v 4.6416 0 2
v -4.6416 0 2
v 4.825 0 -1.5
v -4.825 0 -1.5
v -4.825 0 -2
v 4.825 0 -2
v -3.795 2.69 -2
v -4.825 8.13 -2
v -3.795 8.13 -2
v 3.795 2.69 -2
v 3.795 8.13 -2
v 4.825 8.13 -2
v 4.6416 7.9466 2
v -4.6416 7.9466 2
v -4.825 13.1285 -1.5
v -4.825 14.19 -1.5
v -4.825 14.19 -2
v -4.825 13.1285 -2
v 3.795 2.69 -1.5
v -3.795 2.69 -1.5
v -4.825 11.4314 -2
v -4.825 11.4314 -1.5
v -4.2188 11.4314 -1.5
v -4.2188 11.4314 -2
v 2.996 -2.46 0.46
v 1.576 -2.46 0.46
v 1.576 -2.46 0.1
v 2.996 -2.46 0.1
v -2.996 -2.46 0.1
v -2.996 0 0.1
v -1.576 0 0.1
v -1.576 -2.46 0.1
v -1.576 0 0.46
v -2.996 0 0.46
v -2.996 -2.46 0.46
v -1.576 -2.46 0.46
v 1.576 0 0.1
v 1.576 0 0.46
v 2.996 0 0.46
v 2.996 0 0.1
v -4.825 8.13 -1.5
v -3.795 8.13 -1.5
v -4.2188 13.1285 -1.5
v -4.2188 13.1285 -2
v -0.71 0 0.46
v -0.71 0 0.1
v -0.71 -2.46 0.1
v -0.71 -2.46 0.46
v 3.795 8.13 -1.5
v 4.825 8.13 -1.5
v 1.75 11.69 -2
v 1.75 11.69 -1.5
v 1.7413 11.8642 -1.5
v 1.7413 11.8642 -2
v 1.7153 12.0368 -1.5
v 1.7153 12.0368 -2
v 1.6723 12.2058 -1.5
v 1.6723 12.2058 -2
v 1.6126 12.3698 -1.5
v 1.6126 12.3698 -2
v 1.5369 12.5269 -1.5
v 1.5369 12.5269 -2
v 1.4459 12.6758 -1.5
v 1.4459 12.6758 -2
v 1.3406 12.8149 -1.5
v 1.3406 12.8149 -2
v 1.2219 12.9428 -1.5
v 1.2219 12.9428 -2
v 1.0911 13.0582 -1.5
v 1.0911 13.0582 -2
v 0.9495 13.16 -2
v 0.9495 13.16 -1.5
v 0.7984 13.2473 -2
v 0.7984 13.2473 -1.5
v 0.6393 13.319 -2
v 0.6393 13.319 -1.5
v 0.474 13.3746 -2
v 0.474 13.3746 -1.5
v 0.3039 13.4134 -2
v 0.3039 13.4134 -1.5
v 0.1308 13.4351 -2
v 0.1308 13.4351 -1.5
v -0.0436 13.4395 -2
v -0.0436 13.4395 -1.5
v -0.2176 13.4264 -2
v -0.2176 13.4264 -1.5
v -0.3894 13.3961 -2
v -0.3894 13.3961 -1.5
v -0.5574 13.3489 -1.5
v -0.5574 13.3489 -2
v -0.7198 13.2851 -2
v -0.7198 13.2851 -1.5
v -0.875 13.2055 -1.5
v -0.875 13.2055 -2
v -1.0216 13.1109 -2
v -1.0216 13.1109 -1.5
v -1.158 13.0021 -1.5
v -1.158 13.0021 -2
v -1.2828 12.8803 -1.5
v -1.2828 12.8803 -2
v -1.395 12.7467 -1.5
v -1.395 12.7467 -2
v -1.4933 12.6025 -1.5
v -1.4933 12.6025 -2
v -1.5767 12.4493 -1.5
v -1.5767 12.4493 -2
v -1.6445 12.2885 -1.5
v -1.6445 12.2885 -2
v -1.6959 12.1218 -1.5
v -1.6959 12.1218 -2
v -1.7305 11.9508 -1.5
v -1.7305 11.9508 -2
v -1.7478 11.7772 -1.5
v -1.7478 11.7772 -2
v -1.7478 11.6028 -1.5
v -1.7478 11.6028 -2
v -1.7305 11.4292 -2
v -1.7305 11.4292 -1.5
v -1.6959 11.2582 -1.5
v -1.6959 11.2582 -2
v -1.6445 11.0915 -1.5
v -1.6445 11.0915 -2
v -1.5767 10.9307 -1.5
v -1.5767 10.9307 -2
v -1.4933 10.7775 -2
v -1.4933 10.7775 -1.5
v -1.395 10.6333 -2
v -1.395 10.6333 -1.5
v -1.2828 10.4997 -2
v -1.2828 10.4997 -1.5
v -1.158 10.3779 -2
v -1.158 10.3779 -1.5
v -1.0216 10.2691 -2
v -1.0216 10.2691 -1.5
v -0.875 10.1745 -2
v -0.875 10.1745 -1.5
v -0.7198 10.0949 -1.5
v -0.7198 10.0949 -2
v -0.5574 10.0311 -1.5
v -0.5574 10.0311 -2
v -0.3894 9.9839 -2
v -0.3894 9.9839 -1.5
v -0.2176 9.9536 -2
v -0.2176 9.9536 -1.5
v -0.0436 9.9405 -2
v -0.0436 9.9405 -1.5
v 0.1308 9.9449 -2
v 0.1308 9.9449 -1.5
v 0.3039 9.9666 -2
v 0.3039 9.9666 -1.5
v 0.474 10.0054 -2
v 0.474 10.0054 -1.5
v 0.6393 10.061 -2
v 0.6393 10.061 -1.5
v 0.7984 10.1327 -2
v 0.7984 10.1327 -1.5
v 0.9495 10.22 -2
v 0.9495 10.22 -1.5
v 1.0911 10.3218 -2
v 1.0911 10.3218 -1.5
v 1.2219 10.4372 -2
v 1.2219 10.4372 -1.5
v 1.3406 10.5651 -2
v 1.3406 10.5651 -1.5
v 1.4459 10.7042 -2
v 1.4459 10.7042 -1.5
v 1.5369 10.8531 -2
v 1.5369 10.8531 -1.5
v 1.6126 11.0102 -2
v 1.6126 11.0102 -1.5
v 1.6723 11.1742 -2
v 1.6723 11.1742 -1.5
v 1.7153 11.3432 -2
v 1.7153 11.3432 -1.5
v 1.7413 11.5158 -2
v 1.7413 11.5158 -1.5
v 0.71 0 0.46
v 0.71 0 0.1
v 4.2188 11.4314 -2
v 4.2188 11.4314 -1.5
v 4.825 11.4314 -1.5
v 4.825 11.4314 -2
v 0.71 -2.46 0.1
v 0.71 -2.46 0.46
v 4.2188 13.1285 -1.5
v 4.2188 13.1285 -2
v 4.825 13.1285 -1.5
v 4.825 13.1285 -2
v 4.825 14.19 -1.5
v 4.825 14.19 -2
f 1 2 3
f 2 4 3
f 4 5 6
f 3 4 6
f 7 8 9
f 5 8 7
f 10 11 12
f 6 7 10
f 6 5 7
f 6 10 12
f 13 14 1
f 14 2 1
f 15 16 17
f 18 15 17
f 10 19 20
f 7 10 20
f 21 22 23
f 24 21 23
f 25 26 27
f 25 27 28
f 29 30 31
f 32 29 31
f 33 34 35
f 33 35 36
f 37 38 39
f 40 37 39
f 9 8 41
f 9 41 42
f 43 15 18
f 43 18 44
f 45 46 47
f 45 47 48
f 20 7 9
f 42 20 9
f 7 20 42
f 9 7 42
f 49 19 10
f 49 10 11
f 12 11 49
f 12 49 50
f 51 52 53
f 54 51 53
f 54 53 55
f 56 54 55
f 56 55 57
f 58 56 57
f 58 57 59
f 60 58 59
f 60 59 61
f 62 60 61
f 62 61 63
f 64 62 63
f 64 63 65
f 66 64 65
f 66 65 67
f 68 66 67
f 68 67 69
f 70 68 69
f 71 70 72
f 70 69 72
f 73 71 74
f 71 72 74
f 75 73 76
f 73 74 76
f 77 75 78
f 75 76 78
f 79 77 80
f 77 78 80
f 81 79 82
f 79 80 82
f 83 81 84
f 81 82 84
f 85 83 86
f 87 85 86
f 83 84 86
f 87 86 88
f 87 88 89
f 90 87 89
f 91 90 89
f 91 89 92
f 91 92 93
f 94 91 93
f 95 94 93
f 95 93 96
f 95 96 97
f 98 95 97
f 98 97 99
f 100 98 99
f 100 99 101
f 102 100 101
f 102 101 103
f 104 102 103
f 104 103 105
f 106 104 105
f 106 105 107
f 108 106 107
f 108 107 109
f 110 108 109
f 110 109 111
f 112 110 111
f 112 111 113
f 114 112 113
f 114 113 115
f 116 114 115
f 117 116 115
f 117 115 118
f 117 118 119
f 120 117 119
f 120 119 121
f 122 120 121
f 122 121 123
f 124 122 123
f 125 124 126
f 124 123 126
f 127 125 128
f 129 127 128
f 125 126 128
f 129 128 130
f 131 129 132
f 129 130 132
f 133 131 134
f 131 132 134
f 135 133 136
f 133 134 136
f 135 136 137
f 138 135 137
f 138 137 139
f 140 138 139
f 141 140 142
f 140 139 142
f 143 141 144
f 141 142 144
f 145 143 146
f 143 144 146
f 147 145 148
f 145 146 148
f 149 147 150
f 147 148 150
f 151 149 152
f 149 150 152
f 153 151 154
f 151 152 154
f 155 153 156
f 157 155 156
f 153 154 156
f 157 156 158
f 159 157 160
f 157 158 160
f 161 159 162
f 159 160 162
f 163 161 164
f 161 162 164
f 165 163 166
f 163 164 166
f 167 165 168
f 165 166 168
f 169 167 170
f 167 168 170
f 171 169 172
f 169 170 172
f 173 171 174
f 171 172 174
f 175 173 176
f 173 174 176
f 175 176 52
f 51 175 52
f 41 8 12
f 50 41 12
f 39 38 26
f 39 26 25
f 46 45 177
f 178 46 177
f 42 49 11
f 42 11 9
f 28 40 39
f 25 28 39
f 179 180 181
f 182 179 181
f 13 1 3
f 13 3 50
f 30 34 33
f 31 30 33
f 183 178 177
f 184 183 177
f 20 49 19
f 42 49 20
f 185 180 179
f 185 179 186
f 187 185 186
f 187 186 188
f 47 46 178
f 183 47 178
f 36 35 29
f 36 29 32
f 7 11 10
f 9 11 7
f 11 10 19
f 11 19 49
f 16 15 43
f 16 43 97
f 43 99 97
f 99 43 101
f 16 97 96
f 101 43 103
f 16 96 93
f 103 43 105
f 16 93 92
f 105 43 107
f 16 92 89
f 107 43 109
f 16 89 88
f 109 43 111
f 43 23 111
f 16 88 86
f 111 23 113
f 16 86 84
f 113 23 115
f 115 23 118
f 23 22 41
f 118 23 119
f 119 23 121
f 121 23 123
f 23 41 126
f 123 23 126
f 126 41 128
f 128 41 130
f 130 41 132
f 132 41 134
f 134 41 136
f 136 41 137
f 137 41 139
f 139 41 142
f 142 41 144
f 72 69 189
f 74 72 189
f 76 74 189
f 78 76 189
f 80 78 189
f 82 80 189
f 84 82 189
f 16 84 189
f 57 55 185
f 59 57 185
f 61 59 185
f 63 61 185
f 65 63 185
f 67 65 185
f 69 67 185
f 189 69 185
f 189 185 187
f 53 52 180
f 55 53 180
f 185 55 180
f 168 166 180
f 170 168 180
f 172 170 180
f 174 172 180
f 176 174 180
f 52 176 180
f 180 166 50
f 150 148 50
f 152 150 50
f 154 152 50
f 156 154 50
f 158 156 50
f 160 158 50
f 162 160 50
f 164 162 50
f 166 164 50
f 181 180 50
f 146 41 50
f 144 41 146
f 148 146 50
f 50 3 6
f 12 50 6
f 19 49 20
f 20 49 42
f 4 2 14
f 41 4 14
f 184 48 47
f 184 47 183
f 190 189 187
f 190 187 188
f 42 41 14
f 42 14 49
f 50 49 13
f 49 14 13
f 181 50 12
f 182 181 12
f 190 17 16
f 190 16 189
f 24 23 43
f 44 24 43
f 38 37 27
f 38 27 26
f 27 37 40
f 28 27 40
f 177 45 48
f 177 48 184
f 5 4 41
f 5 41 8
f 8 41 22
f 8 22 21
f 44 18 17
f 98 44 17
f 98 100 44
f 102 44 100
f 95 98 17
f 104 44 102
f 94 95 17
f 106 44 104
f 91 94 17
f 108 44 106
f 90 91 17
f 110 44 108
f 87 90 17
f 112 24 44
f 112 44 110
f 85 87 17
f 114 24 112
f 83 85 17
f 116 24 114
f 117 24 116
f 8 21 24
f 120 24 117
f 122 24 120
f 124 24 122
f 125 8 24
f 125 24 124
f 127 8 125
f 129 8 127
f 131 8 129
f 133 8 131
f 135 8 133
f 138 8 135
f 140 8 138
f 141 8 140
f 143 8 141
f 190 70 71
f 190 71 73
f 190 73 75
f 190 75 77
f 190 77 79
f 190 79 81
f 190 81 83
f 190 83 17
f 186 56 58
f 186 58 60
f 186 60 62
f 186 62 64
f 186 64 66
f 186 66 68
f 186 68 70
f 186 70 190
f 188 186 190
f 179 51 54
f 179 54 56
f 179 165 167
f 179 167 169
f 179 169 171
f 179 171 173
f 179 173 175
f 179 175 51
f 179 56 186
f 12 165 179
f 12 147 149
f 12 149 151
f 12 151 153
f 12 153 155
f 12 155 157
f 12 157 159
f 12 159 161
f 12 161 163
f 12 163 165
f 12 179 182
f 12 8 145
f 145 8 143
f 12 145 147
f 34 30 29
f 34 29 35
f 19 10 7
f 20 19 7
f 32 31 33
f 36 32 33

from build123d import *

# Parameters (mm, degrees)
SKETCH1_W             = 9.65
SKETCH1_H             = 4
BOSS_EXTRUDE1_DEPTH   = 8.13
CHAMFER2_SIZE         = 3.5
CHAMFER2_SIZE2        = 0.183427227
SKETCH4_W             = 9.65
SKETCH4_H             = 0.5
BOSS_EXTRUDE2_DEPTH   = 6.06
CHAMFER3_SIZE         = 3.5
CHAMFER3_SIZE2        = 0.183427227
CHAMFER4_SIZE         = 3.5
CHAMFER4_SIZE2        = 0.183427227
SKETCH5_W             = 7.59
SKETCH5_H             = 5.44
CUT_EXTRUDE1_DEPTH    = 0.5
SKETCH7_W             = 7.59
SKETCH7_H             = 5.44
BOSS_EXTRUDE3_DEPTH   = 0.5
SKETCH8_W             = 1.42
SKETCH8_H             = 0.36
BOSS_EXTRUDE4_DEPTH   = 2.46
BOSS_EXTRUDE4_2_DEPTH = 2.46
BOSS_EXTRUDE4_3_DEPTH = 2.46
SKETCH9_R             = 1.75
CUT_EXTRUDE2_DEPTH    = 2.46
SKETCH10_W            = 0.606244437
SKETCH10_H            = 1.697116576
CUT_EXTRUDE3_DEPTH    = 2.46


with BuildPart() as part:
    # Sketch1 → Boss-Extrude1 (new body)
    with BuildSketch(Plane(origin=(0, 0, 0), x_dir=(1, 0, 0), z_dir=(0, 1, 0))):
        Rectangle(SKETCH1_W, SKETCH1_H)
    extrude(amount=BOSS_EXTRUDE1_DEPTH)

    # Chamfer2
    chamfer2_edges = [part.edges().sort_by_distance(p)[0] for p in [
        (0, 8.13, 2),
    ]]
    chamfer2_side = [part.faces().sort_by_distance(p)[0] for p in [
        (0, 8.13, 0),
    ]]
    chamfer(chamfer2_edges, length=CHAMFER2_SIZE, length2=CHAMFER2_SIZE2, reference=chamfer2_side[0])

    # Chamfer3
    chamfer3_edges = [part.edges().sort_by_distance(p)[0] for p in [
        (4.825, 3.973286386, 2),
    ]]
    chamfer3_side = [part.faces().sort_by_distance(p)[0] for p in [
        (4.825, 4.025084823, -0.00830765),
    ]]
    chamfer(chamfer3_edges, length=CHAMFER3_SIZE, length2=CHAMFER3_SIZE2, reference=chamfer3_side[0])

    # Chamfer4
    chamfer4_edges = [part.edges().sort_by_distance(p)[0] for p in [
        (-4.825, 3.973286386, 2),
    ]]
    chamfer4_side = [part.faces().sort_by_distance(p)[0] for p in [
        (-4.825, 4.025084823, -0.00830765),
    ]]
    chamfer(chamfer4_edges, length=CHAMFER4_SIZE, length2=CHAMFER4_SIZE2, reference=chamfer4_side[0])

    # Sketch5 → Cut-Extrude1 (cut)
    with BuildSketch(Plane(origin=(0, 0, -2), x_dir=(-1, 0, 0), z_dir=(0, 0, -1))):
        with Locations((0, 5.41)):
            Rectangle(SKETCH5_W, SKETCH5_H)
    extrude(amount=-CUT_EXTRUDE1_DEPTH, mode=Mode.SUBTRACT)


with BuildPart() as body_2:
    # Sketch4 → Boss-Extrude2 (new body)
    with BuildSketch(Plane(origin=(0, 8.13, 0), x_dir=(1, 0, 0), z_dir=(0, 1, 0))):
        with Locations((0, 1.75)):
            Rectangle(SKETCH4_W, SKETCH4_H)
    extrude(amount=BOSS_EXTRUDE2_DEPTH)

    # Sketch9 → Cut-Extrude2 (cut)
    with BuildSketch(Plane.XY.offset(-1.5)):
        with Locations((0, 11.69)):
            Circle(SKETCH9_R)
    extrude(amount=-CUT_EXTRUDE2_DEPTH, mode=Mode.SUBTRACT)

    # Sketch10 → Cut-Extrude3 (cut)
    with BuildSketch(Plane.XY.offset(-1.5)):
        with Locations((-4.521877782, 12.279991165)):
            Rectangle(SKETCH10_W, SKETCH10_H)
        with Locations((4.521877782, 12.279991165)):
            Rectangle(SKETCH10_W, SKETCH10_H)
    extrude(amount=-CUT_EXTRUDE3_DEPTH, mode=Mode.SUBTRACT)


with BuildPart() as body_3:
    # Sketch7 → Boss-Extrude3 (new body)
    with BuildSketch(Plane(origin=(0, 0, -1.5), x_dir=(-1, 0, 0), z_dir=(0, 0, -1))):
        with Locations((0, 5.41)):
            Rectangle(SKETCH7_W, SKETCH7_H)
    extrude(amount=BOSS_EXTRUDE3_DEPTH)


with BuildPart() as body_4:
    # Sketch8 → Boss-Extrude4 (new body)
    with BuildSketch(Plane.XZ):
        with Locations((0, 0.28)):
            Rectangle(SKETCH8_W, SKETCH8_H)
    extrude(amount=BOSS_EXTRUDE4_DEPTH)


with BuildPart() as body_5:
    # Sketch8 → Boss-Extrude4 2 (new body)
    with BuildSketch(Plane.XZ):
        with Locations((2.286, 0.28)):
            Rectangle(SKETCH8_W, SKETCH8_H)
    extrude(amount=BOSS_EXTRUDE4_2_DEPTH)


with BuildPart() as body_6:
    # Sketch8 → Boss-Extrude4 3 (new body)
    with BuildSketch(Plane.XZ):
        with Locations((-2.286, 0.28)):
            Rectangle(SKETCH8_W, SKETCH8_H)
    extrude(amount=BOSS_EXTRUDE4_3_DEPTH)


solid = Compound([part.part, body_2.part, body_3.part, body_4.part, body_5.part, body_6.part])
